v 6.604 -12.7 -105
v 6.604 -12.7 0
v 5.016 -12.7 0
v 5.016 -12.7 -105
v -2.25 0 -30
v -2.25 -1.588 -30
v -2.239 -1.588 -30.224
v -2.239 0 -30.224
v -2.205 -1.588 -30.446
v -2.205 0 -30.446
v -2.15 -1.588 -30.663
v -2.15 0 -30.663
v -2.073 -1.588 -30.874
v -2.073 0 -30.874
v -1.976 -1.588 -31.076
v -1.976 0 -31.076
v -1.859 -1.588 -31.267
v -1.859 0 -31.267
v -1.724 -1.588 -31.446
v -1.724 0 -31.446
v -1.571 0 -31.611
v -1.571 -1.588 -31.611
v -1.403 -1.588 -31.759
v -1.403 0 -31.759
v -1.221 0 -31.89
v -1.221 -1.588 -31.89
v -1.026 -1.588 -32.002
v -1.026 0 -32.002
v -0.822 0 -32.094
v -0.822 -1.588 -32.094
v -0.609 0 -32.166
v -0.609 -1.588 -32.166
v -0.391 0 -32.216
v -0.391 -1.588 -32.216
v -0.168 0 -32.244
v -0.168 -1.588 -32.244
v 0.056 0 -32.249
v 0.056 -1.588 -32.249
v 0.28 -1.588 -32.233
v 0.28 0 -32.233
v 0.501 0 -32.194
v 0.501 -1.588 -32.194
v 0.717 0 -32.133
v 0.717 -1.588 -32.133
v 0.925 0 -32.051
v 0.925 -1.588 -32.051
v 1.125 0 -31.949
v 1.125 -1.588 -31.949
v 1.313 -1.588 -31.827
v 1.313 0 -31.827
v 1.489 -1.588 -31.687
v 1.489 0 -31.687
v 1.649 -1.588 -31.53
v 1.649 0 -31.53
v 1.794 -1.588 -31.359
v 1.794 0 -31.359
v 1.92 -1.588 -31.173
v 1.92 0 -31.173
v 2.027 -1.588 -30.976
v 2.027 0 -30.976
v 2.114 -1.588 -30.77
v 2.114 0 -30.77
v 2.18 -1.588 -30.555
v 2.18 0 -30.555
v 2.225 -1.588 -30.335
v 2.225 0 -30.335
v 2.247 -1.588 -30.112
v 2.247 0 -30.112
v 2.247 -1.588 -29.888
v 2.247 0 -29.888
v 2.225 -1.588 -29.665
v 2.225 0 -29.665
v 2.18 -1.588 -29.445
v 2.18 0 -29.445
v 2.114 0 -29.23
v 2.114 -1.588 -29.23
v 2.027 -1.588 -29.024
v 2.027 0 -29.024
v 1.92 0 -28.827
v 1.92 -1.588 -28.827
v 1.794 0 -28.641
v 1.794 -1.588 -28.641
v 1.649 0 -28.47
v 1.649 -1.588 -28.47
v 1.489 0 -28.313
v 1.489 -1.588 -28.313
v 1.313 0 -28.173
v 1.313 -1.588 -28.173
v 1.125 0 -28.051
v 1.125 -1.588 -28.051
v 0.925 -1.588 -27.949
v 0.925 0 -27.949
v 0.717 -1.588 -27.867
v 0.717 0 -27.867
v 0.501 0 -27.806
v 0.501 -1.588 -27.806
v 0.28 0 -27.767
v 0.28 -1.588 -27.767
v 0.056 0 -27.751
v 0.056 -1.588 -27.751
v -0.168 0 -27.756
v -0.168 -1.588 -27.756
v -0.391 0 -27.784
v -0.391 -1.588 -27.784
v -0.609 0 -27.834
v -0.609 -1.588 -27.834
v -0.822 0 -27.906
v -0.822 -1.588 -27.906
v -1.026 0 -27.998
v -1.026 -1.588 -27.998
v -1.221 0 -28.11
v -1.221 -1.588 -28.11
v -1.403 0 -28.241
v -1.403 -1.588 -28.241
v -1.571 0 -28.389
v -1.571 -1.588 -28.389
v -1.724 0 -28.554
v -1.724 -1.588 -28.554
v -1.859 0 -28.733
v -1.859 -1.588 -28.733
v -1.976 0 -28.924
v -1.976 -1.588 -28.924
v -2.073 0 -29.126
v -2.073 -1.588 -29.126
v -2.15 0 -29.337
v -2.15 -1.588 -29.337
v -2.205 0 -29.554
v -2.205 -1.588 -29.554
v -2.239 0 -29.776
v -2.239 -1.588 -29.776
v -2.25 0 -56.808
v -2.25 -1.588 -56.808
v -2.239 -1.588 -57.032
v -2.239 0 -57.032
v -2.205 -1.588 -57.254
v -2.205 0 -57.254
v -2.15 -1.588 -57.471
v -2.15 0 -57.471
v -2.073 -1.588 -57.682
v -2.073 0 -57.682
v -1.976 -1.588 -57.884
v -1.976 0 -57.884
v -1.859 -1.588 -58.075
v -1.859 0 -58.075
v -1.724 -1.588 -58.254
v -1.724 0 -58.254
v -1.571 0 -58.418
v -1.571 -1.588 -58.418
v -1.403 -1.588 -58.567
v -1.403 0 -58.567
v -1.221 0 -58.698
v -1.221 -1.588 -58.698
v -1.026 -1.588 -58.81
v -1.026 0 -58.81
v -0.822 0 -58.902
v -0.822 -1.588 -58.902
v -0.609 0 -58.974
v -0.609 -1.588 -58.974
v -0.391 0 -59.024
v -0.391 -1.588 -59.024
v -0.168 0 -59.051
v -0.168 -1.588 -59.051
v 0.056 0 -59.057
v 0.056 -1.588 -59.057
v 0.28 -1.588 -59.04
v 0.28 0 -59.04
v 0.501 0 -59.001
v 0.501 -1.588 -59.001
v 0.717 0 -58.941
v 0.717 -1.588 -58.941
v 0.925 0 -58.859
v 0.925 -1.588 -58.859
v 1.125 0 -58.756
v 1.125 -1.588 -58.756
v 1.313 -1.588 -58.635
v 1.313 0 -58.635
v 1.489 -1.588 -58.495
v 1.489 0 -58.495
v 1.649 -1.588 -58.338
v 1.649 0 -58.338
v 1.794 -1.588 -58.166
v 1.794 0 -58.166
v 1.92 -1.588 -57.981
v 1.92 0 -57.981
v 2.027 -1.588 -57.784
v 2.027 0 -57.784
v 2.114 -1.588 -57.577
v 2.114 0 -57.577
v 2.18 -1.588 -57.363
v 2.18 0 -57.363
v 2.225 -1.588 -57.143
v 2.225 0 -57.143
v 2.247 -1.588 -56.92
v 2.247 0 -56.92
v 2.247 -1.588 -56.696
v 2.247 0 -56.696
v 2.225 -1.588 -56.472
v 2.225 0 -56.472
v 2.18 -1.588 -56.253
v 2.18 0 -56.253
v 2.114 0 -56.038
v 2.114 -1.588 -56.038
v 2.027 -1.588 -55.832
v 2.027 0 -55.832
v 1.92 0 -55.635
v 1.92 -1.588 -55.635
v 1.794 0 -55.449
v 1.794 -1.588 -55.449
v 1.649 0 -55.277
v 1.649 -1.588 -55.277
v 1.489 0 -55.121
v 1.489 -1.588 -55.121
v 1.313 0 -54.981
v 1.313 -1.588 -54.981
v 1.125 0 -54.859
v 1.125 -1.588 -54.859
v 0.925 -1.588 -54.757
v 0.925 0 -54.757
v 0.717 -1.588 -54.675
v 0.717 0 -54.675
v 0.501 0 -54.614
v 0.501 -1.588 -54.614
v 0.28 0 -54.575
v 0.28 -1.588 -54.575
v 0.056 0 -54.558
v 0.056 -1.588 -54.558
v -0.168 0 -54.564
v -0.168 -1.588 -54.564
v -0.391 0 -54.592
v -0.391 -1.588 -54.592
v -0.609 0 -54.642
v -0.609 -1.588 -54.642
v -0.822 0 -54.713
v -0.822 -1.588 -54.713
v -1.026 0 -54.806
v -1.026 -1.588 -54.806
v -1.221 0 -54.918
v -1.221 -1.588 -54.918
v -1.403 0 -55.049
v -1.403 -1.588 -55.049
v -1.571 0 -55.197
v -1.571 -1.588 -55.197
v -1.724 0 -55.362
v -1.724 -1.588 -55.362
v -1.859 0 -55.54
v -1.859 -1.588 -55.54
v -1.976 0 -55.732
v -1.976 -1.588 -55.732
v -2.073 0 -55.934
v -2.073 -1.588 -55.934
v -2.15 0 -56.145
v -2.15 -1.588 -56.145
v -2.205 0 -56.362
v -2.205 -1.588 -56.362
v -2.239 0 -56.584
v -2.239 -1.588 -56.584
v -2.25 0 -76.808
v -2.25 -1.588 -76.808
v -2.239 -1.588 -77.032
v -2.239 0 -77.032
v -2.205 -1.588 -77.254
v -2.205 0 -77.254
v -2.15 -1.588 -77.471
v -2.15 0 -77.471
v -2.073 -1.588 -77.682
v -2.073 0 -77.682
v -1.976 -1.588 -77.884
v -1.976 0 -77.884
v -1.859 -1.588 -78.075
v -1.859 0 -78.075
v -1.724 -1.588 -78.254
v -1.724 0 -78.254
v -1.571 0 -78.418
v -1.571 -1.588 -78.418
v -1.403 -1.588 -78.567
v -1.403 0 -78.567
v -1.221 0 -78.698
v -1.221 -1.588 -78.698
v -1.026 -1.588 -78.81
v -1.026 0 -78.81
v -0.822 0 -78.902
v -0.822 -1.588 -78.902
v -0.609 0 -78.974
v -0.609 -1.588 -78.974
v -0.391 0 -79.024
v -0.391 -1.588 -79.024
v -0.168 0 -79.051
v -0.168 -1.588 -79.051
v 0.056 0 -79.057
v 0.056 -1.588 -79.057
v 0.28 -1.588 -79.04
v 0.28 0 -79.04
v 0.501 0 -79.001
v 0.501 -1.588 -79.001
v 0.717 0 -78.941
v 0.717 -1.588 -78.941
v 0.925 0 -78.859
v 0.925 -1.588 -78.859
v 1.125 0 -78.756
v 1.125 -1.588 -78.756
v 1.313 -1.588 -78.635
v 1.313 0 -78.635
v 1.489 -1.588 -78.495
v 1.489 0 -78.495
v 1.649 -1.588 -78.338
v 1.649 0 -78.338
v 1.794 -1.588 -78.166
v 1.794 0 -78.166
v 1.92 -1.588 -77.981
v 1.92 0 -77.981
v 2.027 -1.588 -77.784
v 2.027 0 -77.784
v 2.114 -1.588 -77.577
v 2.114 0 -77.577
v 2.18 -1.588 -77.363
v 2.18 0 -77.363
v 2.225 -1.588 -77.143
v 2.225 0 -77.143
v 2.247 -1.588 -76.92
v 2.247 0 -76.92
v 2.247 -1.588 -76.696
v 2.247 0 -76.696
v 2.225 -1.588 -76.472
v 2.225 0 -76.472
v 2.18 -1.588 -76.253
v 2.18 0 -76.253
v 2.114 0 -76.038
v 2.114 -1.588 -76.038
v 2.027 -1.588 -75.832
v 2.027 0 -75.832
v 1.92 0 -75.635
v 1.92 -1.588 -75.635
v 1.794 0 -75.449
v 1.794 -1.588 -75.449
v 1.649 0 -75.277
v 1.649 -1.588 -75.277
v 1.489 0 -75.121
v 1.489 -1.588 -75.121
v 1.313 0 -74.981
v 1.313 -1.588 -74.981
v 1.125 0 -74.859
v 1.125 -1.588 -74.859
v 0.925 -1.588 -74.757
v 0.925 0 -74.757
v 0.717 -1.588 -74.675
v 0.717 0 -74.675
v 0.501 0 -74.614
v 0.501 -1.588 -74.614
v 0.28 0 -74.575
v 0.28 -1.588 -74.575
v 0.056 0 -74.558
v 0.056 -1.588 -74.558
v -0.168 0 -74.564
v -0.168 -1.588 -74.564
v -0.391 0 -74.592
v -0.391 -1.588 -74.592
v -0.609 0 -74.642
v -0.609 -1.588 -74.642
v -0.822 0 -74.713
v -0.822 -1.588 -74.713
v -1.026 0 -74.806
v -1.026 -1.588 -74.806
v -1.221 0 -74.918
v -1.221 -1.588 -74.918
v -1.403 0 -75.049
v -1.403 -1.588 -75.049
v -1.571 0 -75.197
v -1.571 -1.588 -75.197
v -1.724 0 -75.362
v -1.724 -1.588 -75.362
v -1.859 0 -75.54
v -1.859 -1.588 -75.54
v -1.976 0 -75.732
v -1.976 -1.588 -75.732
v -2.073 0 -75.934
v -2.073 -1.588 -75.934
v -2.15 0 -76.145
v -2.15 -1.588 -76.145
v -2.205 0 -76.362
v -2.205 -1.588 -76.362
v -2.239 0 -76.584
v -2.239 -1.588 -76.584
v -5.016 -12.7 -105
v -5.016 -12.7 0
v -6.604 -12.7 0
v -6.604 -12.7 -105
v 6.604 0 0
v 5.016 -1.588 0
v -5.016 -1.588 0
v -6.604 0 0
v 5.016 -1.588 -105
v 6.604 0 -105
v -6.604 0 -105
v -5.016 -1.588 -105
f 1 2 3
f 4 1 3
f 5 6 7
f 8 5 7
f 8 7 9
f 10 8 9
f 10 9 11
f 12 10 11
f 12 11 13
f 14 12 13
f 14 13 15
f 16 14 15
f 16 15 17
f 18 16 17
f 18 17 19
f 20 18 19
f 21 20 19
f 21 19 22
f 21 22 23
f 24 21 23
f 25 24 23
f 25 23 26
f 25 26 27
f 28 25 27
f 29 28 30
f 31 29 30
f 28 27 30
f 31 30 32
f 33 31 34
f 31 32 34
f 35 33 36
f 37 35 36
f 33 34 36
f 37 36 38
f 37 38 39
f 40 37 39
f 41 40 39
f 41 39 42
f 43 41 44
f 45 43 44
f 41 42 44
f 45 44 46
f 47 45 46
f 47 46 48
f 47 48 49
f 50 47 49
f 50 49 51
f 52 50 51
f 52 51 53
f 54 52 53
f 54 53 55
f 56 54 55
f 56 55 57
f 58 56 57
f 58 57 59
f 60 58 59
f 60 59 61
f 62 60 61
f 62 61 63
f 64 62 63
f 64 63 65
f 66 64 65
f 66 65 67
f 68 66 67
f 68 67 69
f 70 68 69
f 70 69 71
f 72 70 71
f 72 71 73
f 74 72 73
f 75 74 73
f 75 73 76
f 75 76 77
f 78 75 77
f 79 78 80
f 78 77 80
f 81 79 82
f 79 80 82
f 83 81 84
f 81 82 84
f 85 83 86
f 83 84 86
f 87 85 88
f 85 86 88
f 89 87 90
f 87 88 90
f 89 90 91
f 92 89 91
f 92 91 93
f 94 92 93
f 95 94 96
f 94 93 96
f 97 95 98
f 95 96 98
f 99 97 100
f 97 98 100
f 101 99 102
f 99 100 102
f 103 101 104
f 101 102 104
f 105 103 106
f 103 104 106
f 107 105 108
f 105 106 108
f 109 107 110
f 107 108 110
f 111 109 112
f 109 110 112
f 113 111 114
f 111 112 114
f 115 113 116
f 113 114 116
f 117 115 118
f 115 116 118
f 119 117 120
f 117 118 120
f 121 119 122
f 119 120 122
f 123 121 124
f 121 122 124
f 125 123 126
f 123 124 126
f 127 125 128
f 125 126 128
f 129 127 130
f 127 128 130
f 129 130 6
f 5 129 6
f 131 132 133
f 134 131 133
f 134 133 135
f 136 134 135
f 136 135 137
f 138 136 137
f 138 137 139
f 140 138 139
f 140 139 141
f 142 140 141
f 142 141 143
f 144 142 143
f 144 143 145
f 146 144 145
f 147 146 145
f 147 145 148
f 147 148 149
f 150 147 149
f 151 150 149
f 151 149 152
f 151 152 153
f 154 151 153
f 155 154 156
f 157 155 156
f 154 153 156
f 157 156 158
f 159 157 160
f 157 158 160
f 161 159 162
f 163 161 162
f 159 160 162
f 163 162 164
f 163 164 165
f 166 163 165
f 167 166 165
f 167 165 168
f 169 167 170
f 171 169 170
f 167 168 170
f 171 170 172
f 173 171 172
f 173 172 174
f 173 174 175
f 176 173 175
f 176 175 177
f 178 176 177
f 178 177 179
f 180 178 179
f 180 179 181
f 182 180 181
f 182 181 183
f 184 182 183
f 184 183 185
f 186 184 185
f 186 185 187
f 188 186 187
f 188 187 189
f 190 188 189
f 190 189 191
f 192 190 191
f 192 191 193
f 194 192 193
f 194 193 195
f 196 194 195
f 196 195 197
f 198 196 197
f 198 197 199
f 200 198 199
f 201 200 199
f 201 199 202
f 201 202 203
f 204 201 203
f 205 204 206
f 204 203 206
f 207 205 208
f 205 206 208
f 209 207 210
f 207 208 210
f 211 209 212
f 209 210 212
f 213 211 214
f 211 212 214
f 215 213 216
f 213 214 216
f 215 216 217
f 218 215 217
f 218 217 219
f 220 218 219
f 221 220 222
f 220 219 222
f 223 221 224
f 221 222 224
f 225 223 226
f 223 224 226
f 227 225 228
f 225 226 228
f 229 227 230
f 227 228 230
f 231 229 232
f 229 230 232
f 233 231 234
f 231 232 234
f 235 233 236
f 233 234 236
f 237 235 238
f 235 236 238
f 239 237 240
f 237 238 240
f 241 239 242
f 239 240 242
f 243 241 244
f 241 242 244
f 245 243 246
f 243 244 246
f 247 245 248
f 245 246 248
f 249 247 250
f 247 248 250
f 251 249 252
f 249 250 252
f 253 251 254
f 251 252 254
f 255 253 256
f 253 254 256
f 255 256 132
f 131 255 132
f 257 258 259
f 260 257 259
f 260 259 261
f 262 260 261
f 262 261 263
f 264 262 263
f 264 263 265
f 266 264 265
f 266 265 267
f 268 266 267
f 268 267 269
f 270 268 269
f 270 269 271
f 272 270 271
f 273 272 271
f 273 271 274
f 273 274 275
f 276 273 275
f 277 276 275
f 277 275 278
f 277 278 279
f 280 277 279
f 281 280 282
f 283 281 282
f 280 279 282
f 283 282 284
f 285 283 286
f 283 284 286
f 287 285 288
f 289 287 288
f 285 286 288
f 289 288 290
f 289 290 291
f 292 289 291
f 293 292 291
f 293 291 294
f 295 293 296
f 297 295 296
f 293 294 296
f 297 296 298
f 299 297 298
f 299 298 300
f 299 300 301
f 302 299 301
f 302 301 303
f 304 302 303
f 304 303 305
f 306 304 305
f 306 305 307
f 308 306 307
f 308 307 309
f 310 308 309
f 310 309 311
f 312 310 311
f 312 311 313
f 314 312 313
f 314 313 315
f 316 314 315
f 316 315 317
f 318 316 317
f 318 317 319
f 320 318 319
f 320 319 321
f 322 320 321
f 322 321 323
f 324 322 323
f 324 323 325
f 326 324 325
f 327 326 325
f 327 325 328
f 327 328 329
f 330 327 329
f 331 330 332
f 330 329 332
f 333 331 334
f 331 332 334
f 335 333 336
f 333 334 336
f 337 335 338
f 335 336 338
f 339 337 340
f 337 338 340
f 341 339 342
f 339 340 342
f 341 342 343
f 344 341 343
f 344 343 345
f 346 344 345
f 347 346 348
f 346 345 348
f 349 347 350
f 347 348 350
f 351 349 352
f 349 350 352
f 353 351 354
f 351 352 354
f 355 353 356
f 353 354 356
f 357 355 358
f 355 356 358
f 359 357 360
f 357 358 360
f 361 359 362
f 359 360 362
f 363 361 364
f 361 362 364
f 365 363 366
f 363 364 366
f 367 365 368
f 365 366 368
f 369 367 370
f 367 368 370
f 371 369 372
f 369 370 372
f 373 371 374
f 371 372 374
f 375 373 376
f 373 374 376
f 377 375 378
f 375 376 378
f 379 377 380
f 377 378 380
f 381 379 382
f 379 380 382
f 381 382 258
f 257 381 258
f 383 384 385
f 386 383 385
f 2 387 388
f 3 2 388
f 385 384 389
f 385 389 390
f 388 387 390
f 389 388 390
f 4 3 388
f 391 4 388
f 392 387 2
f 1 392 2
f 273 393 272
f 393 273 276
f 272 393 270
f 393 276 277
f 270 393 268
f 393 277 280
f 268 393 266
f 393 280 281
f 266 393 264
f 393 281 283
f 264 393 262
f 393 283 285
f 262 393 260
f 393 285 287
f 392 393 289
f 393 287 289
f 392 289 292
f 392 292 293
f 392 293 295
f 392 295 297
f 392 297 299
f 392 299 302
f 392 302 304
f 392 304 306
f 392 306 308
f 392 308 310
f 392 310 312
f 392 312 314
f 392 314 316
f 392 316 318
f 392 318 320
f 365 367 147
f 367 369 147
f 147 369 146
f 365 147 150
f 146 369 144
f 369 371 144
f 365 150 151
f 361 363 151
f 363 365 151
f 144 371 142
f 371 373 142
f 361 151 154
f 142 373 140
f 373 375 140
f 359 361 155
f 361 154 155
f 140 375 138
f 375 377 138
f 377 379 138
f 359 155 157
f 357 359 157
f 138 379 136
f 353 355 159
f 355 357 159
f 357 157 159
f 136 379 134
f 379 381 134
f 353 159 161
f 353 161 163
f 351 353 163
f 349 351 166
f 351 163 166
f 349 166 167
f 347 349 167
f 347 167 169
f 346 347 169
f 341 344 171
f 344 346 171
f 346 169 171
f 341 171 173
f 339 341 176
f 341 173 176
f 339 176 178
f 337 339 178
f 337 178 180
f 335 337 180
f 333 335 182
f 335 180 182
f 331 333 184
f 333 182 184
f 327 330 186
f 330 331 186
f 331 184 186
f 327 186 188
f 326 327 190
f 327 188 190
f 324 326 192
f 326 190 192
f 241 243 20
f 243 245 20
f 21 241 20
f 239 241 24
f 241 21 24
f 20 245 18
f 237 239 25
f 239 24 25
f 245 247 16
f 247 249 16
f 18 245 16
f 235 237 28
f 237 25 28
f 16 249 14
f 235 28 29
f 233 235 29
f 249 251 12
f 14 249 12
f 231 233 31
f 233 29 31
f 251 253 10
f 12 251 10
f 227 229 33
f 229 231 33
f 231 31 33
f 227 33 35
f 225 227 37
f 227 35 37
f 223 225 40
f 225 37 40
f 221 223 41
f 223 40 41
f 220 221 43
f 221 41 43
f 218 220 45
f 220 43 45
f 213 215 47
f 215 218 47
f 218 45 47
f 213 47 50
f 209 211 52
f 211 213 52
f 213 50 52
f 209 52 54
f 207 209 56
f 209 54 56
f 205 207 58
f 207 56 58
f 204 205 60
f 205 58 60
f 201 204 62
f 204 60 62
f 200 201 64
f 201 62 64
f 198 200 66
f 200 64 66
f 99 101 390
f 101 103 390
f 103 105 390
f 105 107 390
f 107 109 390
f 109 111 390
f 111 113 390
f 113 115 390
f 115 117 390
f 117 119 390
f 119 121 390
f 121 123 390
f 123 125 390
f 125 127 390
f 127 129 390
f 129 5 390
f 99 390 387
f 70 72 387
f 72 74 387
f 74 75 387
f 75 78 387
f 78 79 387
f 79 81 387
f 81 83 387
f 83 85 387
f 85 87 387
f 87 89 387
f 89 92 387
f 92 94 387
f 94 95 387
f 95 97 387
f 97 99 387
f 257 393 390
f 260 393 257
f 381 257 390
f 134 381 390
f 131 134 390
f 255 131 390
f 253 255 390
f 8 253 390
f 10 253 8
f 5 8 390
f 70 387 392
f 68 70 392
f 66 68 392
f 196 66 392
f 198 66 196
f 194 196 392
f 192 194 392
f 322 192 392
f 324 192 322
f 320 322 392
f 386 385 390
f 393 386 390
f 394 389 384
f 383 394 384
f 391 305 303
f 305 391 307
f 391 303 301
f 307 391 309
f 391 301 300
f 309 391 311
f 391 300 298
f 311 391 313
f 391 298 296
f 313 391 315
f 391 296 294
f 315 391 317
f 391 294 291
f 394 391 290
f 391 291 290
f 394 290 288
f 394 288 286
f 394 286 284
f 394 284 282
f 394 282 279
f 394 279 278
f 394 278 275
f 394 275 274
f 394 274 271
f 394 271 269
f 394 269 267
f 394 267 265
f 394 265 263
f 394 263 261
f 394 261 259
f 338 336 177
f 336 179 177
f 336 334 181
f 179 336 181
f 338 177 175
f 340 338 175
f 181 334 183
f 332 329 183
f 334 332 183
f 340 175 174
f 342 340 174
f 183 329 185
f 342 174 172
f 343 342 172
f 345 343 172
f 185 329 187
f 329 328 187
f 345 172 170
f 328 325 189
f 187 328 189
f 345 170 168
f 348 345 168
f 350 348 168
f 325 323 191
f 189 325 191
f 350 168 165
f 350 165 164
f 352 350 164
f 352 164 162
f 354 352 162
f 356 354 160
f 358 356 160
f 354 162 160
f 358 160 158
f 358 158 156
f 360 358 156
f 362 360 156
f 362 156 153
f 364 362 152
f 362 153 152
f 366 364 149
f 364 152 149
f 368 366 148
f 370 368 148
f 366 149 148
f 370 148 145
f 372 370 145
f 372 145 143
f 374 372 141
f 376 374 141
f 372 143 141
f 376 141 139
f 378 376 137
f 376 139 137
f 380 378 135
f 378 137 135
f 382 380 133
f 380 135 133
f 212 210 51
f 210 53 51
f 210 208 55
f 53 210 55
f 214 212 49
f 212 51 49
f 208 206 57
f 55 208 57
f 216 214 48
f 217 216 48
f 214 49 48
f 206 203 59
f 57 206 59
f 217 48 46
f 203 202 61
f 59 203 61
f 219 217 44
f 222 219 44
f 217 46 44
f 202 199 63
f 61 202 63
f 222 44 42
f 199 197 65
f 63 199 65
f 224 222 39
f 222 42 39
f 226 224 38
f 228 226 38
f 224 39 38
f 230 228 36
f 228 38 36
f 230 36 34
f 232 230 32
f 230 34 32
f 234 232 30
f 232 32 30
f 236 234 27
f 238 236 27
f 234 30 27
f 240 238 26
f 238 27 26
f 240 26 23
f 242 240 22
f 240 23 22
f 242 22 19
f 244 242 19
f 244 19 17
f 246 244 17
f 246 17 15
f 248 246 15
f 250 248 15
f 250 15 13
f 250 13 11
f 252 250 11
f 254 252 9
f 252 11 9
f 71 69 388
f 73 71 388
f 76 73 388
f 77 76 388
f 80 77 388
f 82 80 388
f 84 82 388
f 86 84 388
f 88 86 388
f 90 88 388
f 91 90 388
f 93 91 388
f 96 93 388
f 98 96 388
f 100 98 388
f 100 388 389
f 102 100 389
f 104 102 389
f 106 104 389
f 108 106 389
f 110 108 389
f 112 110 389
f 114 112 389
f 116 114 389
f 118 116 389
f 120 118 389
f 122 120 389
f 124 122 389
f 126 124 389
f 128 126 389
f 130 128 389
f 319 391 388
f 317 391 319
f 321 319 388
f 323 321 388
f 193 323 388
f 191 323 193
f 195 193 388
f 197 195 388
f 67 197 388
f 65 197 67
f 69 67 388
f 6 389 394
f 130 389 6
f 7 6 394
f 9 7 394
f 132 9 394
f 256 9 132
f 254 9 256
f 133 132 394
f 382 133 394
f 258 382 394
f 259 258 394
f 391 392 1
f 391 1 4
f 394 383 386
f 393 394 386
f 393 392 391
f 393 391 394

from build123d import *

# Parameters (mm, degrees)
BOSS_EXTRUDE1_DEPTH  = 105
M4_CLEARANCE_HOLE2_D = 4.5


with BuildPart() as part:
    # Sketch1 → Boss-Extrude1 (new body)
    with BuildSketch(Plane.XY):
        Polygon((-6.604, 0), (6.604, 0), (6.604, -12.7), (5.0165, -12.7), (5.0165, -1.5875), (-5.0165, -1.5875), (-5.0165, -12.7), (-6.604, -12.7), align=None)
    extrude(amount=-BOSS_EXTRUDE1_DEPTH)

    # M4 Clearance Hole2 (through all)
    with Locations(Plane(origin=(0, 0, 0), x_dir=(1, 0, 0), z_dir=(0, 1, 0))):
        with Locations((0, 56.807786), (0, 30), (0, 76.807786)):
            Hole(M4_CLEARANCE_HOLE2_D / 2)


solid = part.part
